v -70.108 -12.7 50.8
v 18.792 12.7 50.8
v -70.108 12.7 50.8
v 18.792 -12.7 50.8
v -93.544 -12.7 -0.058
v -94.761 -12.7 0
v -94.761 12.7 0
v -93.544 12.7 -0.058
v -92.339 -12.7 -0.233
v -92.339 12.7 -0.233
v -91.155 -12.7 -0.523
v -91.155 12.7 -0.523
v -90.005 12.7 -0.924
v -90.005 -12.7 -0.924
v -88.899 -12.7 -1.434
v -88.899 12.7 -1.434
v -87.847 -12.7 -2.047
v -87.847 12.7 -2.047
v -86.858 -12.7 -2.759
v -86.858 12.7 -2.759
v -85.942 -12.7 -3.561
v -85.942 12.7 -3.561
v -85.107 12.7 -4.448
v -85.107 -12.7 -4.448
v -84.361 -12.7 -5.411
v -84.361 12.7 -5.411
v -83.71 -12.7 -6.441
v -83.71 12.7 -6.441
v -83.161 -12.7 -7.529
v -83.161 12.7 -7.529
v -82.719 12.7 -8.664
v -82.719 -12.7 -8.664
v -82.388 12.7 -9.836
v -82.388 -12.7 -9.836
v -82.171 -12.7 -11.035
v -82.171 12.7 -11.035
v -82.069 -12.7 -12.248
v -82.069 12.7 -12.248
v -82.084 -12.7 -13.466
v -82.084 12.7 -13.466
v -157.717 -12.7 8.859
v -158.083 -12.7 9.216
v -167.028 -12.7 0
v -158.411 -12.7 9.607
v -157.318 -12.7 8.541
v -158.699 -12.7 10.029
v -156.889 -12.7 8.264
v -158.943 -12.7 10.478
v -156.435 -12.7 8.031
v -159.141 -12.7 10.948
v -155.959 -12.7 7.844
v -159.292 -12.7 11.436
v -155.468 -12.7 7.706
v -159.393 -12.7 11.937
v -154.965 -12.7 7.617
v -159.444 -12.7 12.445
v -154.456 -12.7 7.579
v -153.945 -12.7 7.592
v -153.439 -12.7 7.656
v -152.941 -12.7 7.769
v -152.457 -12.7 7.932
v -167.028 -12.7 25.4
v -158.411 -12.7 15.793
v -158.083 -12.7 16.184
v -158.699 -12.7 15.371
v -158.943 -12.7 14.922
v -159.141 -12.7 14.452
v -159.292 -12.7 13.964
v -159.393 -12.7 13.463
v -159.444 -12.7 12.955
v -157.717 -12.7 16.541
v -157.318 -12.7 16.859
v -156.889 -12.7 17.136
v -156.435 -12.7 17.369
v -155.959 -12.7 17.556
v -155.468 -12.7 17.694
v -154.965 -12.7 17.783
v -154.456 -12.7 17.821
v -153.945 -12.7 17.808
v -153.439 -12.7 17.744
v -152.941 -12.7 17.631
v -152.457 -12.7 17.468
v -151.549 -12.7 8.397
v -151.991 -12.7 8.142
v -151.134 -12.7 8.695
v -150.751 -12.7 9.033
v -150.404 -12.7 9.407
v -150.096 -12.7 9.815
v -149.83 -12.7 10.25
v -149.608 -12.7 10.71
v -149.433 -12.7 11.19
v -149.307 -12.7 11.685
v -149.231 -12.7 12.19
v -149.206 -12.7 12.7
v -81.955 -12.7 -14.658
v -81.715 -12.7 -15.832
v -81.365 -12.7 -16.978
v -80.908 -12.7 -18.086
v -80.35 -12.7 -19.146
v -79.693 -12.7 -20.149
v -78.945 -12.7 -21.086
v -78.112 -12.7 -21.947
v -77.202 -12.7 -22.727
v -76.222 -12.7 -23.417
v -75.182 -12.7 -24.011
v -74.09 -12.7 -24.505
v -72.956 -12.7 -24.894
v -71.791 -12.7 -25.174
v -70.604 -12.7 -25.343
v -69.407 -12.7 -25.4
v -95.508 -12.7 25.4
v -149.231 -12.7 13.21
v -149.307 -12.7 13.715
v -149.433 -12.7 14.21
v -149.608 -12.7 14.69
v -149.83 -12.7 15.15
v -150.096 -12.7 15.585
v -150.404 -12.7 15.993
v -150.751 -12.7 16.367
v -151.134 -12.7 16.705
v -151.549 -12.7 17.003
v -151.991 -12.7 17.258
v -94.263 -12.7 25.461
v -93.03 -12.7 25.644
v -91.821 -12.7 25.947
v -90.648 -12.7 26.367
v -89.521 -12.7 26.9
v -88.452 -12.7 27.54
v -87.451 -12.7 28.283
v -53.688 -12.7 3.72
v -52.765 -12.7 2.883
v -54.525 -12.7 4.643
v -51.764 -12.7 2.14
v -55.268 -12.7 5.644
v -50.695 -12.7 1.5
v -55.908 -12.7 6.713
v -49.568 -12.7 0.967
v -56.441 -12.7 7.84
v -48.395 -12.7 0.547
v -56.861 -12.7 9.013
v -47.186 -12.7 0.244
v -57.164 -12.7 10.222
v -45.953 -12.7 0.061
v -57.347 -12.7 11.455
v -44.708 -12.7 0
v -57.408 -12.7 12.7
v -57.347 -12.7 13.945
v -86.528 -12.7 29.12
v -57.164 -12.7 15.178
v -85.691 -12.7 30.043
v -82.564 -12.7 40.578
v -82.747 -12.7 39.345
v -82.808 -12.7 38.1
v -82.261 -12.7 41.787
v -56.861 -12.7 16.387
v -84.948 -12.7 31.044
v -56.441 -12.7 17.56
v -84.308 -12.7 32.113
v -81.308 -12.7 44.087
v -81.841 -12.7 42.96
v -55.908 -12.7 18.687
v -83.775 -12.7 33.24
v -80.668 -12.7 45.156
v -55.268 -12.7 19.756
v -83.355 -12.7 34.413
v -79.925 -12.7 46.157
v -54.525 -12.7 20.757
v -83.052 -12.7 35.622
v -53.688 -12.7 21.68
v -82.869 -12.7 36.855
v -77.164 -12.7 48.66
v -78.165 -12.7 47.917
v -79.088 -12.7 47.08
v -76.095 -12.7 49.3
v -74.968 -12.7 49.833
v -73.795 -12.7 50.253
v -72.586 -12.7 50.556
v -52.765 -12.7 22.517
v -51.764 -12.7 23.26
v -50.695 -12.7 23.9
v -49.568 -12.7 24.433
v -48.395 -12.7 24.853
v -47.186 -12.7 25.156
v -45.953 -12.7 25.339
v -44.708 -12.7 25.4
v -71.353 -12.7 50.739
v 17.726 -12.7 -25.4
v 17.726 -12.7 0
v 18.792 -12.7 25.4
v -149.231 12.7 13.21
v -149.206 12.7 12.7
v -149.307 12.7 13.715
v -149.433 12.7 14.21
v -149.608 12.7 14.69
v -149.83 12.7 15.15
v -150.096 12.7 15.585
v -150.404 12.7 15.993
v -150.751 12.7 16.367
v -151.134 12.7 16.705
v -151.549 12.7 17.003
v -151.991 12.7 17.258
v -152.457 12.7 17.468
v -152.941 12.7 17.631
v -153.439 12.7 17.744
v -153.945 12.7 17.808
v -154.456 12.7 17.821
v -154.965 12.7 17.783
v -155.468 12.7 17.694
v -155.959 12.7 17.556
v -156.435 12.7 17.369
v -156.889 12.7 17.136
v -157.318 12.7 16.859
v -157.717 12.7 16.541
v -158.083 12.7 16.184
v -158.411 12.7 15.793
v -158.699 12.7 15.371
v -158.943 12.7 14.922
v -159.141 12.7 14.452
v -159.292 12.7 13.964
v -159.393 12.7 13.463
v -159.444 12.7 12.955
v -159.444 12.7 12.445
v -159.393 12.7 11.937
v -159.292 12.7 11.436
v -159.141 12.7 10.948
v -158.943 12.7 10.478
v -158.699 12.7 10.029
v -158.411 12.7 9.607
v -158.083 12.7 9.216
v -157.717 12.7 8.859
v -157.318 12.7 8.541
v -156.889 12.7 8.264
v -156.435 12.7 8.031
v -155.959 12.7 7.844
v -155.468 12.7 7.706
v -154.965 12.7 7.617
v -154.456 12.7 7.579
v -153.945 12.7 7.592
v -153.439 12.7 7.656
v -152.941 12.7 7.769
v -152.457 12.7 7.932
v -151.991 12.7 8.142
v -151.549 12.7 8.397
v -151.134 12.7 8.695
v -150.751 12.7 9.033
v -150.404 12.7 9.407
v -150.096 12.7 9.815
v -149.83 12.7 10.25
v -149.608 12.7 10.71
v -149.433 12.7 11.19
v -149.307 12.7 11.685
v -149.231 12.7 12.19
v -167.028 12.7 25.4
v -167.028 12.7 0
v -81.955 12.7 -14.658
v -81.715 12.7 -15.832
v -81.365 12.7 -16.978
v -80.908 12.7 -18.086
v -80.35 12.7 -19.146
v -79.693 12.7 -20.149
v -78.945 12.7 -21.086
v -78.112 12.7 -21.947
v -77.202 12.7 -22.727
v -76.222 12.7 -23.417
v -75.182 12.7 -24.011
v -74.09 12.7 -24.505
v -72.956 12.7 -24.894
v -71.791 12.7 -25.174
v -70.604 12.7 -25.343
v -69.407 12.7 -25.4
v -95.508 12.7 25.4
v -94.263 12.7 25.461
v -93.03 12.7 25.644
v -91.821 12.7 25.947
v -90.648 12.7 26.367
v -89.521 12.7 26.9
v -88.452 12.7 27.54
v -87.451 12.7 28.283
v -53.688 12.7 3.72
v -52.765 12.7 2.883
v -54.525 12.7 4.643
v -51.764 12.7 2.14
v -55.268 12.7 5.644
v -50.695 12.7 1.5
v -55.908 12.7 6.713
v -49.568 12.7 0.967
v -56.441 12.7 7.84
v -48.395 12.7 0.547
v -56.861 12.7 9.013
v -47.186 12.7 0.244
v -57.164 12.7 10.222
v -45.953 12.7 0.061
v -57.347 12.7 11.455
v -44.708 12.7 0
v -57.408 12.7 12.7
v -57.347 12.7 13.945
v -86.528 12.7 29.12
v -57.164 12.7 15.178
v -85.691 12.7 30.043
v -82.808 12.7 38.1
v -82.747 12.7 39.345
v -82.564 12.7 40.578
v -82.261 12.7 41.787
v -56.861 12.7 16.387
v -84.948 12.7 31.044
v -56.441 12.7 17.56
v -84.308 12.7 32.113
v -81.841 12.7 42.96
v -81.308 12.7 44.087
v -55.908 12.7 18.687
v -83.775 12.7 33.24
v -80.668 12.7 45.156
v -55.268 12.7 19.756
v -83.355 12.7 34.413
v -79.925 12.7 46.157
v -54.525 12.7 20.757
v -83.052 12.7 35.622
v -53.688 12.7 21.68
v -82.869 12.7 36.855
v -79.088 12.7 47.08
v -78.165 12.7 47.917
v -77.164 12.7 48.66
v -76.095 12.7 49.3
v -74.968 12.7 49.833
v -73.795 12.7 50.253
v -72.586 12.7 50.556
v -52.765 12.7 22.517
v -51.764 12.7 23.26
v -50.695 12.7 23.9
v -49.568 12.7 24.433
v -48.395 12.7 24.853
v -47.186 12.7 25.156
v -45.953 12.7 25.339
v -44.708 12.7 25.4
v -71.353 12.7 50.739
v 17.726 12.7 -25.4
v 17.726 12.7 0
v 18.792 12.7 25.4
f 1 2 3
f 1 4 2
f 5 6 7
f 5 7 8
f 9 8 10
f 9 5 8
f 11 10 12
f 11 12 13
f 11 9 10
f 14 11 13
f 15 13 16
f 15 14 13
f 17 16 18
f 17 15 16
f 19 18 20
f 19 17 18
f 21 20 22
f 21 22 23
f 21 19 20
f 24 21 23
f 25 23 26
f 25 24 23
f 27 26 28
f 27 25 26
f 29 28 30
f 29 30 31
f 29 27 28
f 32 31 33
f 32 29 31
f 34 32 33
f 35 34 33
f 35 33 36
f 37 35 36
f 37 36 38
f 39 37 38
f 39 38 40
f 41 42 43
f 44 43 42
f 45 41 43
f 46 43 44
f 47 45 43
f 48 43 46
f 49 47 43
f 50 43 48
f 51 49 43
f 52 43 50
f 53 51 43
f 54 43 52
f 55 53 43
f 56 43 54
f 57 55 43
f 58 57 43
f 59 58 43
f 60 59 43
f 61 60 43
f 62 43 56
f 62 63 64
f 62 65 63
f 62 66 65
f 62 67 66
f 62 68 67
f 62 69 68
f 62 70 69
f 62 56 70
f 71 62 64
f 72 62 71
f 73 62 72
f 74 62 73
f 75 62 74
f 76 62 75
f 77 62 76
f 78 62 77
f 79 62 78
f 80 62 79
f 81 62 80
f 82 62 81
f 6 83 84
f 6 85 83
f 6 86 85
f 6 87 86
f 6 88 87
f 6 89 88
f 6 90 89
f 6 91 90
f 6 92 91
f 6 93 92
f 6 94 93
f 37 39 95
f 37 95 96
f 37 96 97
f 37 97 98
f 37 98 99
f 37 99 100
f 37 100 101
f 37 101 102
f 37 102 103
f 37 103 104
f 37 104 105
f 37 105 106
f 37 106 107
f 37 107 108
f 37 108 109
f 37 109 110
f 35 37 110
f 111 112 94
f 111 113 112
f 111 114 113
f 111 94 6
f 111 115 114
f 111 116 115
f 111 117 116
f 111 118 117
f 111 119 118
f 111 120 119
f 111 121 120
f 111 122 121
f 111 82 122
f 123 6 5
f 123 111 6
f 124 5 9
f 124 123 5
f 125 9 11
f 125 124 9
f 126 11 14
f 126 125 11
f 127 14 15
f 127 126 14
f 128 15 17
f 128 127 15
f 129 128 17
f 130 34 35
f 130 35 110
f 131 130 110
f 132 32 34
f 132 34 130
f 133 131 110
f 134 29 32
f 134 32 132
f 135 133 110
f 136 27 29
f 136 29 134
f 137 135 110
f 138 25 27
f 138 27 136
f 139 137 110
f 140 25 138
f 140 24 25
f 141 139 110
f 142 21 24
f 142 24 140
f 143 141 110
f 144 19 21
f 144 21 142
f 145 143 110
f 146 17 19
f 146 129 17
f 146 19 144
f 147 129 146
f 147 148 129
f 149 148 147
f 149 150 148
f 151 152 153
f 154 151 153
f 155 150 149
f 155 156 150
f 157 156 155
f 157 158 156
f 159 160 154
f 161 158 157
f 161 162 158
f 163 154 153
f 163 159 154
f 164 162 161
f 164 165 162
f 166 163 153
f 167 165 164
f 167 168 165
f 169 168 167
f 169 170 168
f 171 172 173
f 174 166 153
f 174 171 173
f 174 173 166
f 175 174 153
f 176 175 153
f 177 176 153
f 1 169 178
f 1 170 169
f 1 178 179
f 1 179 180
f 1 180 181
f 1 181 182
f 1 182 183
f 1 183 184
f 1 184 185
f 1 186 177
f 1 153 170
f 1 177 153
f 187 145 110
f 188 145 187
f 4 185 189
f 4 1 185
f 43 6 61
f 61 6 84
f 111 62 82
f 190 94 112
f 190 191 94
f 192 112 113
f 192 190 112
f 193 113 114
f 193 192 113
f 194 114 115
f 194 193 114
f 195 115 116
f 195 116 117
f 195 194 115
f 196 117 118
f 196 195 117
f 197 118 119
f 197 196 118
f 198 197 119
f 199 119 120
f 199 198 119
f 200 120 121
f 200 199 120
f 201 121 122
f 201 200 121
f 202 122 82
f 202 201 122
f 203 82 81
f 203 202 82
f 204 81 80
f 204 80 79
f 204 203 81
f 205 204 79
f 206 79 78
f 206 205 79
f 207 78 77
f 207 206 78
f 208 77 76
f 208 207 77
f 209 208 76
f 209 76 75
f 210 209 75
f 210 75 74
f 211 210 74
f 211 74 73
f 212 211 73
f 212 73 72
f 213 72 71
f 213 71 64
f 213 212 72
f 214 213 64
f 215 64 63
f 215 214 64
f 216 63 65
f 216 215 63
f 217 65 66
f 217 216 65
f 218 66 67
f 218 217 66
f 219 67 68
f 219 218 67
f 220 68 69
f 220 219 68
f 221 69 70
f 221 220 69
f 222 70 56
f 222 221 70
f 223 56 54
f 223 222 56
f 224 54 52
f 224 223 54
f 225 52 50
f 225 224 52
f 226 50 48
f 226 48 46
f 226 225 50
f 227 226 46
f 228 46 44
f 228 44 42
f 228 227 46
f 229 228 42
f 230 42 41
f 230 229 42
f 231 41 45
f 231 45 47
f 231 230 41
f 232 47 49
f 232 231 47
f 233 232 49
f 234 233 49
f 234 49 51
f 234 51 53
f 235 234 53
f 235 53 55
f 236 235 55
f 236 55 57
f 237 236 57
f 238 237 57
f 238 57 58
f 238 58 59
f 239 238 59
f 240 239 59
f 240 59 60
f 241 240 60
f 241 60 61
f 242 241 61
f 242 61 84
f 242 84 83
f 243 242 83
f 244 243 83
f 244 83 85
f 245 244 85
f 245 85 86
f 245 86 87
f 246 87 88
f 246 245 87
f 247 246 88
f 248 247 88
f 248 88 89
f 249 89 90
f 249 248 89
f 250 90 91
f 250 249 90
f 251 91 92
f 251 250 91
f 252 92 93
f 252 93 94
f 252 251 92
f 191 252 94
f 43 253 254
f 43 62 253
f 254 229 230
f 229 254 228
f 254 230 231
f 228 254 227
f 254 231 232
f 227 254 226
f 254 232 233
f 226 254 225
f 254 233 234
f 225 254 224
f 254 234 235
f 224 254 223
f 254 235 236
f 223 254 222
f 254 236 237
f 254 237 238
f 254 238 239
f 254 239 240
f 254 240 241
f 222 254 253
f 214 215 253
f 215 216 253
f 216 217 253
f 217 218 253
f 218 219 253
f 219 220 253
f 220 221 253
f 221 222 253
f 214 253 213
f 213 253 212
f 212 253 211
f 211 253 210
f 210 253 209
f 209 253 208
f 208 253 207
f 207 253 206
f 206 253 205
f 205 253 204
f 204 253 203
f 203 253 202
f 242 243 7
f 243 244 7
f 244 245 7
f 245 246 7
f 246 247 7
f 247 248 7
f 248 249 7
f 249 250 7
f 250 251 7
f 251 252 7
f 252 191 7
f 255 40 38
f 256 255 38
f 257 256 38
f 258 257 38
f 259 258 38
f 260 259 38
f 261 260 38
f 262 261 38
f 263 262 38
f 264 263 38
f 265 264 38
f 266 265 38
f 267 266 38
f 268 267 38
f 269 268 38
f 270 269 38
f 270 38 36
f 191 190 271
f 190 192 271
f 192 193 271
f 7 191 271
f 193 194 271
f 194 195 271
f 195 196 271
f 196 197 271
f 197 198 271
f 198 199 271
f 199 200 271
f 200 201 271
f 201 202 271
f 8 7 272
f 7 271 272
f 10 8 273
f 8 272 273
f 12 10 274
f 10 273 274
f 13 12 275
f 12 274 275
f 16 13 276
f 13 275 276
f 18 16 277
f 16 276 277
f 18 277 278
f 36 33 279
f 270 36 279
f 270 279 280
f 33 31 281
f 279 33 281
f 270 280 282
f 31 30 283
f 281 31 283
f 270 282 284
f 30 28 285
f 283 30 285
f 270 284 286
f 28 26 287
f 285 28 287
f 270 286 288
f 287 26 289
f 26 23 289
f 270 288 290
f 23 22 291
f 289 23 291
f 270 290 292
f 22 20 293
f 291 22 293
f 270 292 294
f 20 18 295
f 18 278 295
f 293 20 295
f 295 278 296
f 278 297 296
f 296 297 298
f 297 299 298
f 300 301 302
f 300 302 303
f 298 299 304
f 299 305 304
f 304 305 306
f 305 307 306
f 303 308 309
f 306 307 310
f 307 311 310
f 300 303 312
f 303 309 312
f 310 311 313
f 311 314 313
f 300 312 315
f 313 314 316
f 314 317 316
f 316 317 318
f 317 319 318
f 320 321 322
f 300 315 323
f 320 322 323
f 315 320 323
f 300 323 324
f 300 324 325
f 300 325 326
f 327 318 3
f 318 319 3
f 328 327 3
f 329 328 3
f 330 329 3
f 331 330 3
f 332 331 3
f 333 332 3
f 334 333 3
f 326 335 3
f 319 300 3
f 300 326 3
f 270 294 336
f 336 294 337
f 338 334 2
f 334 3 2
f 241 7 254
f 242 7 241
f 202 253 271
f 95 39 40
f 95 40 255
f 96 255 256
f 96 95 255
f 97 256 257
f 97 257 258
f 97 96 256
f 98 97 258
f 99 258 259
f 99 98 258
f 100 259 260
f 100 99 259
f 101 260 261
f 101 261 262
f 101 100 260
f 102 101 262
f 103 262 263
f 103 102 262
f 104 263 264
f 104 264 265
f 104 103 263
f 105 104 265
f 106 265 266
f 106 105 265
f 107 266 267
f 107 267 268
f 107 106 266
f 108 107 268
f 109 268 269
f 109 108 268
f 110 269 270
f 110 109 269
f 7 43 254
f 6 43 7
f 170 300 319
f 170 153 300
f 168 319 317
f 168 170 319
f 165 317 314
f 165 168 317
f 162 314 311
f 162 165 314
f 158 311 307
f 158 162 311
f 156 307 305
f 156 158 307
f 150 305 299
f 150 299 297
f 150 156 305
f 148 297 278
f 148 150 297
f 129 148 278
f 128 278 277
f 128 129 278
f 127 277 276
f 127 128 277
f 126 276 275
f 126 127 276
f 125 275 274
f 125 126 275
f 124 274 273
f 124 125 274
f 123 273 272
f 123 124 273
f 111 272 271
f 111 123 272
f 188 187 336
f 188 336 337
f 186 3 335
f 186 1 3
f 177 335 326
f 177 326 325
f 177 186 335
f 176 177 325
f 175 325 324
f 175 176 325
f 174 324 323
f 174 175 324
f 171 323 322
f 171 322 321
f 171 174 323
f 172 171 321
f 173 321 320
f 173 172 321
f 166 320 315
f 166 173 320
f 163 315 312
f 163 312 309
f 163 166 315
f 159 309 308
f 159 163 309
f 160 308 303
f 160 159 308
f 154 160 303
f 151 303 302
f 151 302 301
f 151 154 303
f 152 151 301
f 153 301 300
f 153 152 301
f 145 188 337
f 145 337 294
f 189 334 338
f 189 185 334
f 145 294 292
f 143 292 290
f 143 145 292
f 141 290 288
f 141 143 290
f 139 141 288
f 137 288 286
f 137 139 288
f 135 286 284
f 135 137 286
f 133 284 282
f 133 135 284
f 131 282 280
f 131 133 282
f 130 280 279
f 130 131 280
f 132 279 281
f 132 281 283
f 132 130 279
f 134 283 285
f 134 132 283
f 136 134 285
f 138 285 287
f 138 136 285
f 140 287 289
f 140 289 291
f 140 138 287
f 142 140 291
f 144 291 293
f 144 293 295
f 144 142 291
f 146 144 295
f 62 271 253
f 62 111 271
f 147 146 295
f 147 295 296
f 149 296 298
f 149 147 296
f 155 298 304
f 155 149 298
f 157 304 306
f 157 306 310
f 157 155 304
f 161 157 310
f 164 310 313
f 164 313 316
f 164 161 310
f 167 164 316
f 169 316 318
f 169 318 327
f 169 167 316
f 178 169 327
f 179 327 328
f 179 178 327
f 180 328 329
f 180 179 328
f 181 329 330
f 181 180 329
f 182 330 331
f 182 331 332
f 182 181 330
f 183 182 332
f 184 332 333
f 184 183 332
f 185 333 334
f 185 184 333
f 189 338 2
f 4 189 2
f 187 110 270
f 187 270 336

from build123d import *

# Parameters (mm, degrees)
F0_R     = 5.122277
F1_DEPTH = 12.7


with BuildPart() as f1:
    # F0 (on Front) → F1 (new body, symmetric)
    with BuildSketch(Plane.XZ):
        with BuildLine():
            Line((-167.027999, 0), (-94.760983, 0))
            ThreePointArc((-94.760983, 0), (-85.513701, -3.994957), (-82.084134, -13.466491))
            ThreePointArc((-82.084134, -13.466491), (-78.112329, -21.947282), (-69.407286, -25.4))
            Line((-69.407286, -25.4), (17.726313, -25.4))
            Line((17.726313, -25.4), (17.726313, 0))
            Line((17.726313, 0), (-44.7079, 0))
            ThreePointArc((-44.7079, 0), (-53.688157, 3.719744), (-57.4079, 12.7))
            ThreePointArc((-57.4079, 12.7), (-53.688157, 21.680256), (-44.7079, 25.4))
            Line((-44.7079, 25.4), (18.7921, 25.4))
            Line((18.7921, 25.4), (18.7921, 50.8))
            Line((18.7921, 50.8), (-70.1079, 50.8))
            ThreePointArc((-70.1079, 50.8), (-79.088157, 47.080256), (-82.8079, 38.1))
            ThreePointArc((-82.8079, 38.1), (-86.527644, 29.119744), (-95.5079, 25.4))
            Line((-95.5079, 25.4), (-167.027999, 25.4))
            Line((-167.027999, 25.4), (-167.027999, 0))
        make_face()
        with Locations((-154.327999, 12.7)):
            Circle(F0_R, mode=Mode.SUBTRACT)
    extrude(amount=F1_DEPTH, both=True)


solid = f1.part
